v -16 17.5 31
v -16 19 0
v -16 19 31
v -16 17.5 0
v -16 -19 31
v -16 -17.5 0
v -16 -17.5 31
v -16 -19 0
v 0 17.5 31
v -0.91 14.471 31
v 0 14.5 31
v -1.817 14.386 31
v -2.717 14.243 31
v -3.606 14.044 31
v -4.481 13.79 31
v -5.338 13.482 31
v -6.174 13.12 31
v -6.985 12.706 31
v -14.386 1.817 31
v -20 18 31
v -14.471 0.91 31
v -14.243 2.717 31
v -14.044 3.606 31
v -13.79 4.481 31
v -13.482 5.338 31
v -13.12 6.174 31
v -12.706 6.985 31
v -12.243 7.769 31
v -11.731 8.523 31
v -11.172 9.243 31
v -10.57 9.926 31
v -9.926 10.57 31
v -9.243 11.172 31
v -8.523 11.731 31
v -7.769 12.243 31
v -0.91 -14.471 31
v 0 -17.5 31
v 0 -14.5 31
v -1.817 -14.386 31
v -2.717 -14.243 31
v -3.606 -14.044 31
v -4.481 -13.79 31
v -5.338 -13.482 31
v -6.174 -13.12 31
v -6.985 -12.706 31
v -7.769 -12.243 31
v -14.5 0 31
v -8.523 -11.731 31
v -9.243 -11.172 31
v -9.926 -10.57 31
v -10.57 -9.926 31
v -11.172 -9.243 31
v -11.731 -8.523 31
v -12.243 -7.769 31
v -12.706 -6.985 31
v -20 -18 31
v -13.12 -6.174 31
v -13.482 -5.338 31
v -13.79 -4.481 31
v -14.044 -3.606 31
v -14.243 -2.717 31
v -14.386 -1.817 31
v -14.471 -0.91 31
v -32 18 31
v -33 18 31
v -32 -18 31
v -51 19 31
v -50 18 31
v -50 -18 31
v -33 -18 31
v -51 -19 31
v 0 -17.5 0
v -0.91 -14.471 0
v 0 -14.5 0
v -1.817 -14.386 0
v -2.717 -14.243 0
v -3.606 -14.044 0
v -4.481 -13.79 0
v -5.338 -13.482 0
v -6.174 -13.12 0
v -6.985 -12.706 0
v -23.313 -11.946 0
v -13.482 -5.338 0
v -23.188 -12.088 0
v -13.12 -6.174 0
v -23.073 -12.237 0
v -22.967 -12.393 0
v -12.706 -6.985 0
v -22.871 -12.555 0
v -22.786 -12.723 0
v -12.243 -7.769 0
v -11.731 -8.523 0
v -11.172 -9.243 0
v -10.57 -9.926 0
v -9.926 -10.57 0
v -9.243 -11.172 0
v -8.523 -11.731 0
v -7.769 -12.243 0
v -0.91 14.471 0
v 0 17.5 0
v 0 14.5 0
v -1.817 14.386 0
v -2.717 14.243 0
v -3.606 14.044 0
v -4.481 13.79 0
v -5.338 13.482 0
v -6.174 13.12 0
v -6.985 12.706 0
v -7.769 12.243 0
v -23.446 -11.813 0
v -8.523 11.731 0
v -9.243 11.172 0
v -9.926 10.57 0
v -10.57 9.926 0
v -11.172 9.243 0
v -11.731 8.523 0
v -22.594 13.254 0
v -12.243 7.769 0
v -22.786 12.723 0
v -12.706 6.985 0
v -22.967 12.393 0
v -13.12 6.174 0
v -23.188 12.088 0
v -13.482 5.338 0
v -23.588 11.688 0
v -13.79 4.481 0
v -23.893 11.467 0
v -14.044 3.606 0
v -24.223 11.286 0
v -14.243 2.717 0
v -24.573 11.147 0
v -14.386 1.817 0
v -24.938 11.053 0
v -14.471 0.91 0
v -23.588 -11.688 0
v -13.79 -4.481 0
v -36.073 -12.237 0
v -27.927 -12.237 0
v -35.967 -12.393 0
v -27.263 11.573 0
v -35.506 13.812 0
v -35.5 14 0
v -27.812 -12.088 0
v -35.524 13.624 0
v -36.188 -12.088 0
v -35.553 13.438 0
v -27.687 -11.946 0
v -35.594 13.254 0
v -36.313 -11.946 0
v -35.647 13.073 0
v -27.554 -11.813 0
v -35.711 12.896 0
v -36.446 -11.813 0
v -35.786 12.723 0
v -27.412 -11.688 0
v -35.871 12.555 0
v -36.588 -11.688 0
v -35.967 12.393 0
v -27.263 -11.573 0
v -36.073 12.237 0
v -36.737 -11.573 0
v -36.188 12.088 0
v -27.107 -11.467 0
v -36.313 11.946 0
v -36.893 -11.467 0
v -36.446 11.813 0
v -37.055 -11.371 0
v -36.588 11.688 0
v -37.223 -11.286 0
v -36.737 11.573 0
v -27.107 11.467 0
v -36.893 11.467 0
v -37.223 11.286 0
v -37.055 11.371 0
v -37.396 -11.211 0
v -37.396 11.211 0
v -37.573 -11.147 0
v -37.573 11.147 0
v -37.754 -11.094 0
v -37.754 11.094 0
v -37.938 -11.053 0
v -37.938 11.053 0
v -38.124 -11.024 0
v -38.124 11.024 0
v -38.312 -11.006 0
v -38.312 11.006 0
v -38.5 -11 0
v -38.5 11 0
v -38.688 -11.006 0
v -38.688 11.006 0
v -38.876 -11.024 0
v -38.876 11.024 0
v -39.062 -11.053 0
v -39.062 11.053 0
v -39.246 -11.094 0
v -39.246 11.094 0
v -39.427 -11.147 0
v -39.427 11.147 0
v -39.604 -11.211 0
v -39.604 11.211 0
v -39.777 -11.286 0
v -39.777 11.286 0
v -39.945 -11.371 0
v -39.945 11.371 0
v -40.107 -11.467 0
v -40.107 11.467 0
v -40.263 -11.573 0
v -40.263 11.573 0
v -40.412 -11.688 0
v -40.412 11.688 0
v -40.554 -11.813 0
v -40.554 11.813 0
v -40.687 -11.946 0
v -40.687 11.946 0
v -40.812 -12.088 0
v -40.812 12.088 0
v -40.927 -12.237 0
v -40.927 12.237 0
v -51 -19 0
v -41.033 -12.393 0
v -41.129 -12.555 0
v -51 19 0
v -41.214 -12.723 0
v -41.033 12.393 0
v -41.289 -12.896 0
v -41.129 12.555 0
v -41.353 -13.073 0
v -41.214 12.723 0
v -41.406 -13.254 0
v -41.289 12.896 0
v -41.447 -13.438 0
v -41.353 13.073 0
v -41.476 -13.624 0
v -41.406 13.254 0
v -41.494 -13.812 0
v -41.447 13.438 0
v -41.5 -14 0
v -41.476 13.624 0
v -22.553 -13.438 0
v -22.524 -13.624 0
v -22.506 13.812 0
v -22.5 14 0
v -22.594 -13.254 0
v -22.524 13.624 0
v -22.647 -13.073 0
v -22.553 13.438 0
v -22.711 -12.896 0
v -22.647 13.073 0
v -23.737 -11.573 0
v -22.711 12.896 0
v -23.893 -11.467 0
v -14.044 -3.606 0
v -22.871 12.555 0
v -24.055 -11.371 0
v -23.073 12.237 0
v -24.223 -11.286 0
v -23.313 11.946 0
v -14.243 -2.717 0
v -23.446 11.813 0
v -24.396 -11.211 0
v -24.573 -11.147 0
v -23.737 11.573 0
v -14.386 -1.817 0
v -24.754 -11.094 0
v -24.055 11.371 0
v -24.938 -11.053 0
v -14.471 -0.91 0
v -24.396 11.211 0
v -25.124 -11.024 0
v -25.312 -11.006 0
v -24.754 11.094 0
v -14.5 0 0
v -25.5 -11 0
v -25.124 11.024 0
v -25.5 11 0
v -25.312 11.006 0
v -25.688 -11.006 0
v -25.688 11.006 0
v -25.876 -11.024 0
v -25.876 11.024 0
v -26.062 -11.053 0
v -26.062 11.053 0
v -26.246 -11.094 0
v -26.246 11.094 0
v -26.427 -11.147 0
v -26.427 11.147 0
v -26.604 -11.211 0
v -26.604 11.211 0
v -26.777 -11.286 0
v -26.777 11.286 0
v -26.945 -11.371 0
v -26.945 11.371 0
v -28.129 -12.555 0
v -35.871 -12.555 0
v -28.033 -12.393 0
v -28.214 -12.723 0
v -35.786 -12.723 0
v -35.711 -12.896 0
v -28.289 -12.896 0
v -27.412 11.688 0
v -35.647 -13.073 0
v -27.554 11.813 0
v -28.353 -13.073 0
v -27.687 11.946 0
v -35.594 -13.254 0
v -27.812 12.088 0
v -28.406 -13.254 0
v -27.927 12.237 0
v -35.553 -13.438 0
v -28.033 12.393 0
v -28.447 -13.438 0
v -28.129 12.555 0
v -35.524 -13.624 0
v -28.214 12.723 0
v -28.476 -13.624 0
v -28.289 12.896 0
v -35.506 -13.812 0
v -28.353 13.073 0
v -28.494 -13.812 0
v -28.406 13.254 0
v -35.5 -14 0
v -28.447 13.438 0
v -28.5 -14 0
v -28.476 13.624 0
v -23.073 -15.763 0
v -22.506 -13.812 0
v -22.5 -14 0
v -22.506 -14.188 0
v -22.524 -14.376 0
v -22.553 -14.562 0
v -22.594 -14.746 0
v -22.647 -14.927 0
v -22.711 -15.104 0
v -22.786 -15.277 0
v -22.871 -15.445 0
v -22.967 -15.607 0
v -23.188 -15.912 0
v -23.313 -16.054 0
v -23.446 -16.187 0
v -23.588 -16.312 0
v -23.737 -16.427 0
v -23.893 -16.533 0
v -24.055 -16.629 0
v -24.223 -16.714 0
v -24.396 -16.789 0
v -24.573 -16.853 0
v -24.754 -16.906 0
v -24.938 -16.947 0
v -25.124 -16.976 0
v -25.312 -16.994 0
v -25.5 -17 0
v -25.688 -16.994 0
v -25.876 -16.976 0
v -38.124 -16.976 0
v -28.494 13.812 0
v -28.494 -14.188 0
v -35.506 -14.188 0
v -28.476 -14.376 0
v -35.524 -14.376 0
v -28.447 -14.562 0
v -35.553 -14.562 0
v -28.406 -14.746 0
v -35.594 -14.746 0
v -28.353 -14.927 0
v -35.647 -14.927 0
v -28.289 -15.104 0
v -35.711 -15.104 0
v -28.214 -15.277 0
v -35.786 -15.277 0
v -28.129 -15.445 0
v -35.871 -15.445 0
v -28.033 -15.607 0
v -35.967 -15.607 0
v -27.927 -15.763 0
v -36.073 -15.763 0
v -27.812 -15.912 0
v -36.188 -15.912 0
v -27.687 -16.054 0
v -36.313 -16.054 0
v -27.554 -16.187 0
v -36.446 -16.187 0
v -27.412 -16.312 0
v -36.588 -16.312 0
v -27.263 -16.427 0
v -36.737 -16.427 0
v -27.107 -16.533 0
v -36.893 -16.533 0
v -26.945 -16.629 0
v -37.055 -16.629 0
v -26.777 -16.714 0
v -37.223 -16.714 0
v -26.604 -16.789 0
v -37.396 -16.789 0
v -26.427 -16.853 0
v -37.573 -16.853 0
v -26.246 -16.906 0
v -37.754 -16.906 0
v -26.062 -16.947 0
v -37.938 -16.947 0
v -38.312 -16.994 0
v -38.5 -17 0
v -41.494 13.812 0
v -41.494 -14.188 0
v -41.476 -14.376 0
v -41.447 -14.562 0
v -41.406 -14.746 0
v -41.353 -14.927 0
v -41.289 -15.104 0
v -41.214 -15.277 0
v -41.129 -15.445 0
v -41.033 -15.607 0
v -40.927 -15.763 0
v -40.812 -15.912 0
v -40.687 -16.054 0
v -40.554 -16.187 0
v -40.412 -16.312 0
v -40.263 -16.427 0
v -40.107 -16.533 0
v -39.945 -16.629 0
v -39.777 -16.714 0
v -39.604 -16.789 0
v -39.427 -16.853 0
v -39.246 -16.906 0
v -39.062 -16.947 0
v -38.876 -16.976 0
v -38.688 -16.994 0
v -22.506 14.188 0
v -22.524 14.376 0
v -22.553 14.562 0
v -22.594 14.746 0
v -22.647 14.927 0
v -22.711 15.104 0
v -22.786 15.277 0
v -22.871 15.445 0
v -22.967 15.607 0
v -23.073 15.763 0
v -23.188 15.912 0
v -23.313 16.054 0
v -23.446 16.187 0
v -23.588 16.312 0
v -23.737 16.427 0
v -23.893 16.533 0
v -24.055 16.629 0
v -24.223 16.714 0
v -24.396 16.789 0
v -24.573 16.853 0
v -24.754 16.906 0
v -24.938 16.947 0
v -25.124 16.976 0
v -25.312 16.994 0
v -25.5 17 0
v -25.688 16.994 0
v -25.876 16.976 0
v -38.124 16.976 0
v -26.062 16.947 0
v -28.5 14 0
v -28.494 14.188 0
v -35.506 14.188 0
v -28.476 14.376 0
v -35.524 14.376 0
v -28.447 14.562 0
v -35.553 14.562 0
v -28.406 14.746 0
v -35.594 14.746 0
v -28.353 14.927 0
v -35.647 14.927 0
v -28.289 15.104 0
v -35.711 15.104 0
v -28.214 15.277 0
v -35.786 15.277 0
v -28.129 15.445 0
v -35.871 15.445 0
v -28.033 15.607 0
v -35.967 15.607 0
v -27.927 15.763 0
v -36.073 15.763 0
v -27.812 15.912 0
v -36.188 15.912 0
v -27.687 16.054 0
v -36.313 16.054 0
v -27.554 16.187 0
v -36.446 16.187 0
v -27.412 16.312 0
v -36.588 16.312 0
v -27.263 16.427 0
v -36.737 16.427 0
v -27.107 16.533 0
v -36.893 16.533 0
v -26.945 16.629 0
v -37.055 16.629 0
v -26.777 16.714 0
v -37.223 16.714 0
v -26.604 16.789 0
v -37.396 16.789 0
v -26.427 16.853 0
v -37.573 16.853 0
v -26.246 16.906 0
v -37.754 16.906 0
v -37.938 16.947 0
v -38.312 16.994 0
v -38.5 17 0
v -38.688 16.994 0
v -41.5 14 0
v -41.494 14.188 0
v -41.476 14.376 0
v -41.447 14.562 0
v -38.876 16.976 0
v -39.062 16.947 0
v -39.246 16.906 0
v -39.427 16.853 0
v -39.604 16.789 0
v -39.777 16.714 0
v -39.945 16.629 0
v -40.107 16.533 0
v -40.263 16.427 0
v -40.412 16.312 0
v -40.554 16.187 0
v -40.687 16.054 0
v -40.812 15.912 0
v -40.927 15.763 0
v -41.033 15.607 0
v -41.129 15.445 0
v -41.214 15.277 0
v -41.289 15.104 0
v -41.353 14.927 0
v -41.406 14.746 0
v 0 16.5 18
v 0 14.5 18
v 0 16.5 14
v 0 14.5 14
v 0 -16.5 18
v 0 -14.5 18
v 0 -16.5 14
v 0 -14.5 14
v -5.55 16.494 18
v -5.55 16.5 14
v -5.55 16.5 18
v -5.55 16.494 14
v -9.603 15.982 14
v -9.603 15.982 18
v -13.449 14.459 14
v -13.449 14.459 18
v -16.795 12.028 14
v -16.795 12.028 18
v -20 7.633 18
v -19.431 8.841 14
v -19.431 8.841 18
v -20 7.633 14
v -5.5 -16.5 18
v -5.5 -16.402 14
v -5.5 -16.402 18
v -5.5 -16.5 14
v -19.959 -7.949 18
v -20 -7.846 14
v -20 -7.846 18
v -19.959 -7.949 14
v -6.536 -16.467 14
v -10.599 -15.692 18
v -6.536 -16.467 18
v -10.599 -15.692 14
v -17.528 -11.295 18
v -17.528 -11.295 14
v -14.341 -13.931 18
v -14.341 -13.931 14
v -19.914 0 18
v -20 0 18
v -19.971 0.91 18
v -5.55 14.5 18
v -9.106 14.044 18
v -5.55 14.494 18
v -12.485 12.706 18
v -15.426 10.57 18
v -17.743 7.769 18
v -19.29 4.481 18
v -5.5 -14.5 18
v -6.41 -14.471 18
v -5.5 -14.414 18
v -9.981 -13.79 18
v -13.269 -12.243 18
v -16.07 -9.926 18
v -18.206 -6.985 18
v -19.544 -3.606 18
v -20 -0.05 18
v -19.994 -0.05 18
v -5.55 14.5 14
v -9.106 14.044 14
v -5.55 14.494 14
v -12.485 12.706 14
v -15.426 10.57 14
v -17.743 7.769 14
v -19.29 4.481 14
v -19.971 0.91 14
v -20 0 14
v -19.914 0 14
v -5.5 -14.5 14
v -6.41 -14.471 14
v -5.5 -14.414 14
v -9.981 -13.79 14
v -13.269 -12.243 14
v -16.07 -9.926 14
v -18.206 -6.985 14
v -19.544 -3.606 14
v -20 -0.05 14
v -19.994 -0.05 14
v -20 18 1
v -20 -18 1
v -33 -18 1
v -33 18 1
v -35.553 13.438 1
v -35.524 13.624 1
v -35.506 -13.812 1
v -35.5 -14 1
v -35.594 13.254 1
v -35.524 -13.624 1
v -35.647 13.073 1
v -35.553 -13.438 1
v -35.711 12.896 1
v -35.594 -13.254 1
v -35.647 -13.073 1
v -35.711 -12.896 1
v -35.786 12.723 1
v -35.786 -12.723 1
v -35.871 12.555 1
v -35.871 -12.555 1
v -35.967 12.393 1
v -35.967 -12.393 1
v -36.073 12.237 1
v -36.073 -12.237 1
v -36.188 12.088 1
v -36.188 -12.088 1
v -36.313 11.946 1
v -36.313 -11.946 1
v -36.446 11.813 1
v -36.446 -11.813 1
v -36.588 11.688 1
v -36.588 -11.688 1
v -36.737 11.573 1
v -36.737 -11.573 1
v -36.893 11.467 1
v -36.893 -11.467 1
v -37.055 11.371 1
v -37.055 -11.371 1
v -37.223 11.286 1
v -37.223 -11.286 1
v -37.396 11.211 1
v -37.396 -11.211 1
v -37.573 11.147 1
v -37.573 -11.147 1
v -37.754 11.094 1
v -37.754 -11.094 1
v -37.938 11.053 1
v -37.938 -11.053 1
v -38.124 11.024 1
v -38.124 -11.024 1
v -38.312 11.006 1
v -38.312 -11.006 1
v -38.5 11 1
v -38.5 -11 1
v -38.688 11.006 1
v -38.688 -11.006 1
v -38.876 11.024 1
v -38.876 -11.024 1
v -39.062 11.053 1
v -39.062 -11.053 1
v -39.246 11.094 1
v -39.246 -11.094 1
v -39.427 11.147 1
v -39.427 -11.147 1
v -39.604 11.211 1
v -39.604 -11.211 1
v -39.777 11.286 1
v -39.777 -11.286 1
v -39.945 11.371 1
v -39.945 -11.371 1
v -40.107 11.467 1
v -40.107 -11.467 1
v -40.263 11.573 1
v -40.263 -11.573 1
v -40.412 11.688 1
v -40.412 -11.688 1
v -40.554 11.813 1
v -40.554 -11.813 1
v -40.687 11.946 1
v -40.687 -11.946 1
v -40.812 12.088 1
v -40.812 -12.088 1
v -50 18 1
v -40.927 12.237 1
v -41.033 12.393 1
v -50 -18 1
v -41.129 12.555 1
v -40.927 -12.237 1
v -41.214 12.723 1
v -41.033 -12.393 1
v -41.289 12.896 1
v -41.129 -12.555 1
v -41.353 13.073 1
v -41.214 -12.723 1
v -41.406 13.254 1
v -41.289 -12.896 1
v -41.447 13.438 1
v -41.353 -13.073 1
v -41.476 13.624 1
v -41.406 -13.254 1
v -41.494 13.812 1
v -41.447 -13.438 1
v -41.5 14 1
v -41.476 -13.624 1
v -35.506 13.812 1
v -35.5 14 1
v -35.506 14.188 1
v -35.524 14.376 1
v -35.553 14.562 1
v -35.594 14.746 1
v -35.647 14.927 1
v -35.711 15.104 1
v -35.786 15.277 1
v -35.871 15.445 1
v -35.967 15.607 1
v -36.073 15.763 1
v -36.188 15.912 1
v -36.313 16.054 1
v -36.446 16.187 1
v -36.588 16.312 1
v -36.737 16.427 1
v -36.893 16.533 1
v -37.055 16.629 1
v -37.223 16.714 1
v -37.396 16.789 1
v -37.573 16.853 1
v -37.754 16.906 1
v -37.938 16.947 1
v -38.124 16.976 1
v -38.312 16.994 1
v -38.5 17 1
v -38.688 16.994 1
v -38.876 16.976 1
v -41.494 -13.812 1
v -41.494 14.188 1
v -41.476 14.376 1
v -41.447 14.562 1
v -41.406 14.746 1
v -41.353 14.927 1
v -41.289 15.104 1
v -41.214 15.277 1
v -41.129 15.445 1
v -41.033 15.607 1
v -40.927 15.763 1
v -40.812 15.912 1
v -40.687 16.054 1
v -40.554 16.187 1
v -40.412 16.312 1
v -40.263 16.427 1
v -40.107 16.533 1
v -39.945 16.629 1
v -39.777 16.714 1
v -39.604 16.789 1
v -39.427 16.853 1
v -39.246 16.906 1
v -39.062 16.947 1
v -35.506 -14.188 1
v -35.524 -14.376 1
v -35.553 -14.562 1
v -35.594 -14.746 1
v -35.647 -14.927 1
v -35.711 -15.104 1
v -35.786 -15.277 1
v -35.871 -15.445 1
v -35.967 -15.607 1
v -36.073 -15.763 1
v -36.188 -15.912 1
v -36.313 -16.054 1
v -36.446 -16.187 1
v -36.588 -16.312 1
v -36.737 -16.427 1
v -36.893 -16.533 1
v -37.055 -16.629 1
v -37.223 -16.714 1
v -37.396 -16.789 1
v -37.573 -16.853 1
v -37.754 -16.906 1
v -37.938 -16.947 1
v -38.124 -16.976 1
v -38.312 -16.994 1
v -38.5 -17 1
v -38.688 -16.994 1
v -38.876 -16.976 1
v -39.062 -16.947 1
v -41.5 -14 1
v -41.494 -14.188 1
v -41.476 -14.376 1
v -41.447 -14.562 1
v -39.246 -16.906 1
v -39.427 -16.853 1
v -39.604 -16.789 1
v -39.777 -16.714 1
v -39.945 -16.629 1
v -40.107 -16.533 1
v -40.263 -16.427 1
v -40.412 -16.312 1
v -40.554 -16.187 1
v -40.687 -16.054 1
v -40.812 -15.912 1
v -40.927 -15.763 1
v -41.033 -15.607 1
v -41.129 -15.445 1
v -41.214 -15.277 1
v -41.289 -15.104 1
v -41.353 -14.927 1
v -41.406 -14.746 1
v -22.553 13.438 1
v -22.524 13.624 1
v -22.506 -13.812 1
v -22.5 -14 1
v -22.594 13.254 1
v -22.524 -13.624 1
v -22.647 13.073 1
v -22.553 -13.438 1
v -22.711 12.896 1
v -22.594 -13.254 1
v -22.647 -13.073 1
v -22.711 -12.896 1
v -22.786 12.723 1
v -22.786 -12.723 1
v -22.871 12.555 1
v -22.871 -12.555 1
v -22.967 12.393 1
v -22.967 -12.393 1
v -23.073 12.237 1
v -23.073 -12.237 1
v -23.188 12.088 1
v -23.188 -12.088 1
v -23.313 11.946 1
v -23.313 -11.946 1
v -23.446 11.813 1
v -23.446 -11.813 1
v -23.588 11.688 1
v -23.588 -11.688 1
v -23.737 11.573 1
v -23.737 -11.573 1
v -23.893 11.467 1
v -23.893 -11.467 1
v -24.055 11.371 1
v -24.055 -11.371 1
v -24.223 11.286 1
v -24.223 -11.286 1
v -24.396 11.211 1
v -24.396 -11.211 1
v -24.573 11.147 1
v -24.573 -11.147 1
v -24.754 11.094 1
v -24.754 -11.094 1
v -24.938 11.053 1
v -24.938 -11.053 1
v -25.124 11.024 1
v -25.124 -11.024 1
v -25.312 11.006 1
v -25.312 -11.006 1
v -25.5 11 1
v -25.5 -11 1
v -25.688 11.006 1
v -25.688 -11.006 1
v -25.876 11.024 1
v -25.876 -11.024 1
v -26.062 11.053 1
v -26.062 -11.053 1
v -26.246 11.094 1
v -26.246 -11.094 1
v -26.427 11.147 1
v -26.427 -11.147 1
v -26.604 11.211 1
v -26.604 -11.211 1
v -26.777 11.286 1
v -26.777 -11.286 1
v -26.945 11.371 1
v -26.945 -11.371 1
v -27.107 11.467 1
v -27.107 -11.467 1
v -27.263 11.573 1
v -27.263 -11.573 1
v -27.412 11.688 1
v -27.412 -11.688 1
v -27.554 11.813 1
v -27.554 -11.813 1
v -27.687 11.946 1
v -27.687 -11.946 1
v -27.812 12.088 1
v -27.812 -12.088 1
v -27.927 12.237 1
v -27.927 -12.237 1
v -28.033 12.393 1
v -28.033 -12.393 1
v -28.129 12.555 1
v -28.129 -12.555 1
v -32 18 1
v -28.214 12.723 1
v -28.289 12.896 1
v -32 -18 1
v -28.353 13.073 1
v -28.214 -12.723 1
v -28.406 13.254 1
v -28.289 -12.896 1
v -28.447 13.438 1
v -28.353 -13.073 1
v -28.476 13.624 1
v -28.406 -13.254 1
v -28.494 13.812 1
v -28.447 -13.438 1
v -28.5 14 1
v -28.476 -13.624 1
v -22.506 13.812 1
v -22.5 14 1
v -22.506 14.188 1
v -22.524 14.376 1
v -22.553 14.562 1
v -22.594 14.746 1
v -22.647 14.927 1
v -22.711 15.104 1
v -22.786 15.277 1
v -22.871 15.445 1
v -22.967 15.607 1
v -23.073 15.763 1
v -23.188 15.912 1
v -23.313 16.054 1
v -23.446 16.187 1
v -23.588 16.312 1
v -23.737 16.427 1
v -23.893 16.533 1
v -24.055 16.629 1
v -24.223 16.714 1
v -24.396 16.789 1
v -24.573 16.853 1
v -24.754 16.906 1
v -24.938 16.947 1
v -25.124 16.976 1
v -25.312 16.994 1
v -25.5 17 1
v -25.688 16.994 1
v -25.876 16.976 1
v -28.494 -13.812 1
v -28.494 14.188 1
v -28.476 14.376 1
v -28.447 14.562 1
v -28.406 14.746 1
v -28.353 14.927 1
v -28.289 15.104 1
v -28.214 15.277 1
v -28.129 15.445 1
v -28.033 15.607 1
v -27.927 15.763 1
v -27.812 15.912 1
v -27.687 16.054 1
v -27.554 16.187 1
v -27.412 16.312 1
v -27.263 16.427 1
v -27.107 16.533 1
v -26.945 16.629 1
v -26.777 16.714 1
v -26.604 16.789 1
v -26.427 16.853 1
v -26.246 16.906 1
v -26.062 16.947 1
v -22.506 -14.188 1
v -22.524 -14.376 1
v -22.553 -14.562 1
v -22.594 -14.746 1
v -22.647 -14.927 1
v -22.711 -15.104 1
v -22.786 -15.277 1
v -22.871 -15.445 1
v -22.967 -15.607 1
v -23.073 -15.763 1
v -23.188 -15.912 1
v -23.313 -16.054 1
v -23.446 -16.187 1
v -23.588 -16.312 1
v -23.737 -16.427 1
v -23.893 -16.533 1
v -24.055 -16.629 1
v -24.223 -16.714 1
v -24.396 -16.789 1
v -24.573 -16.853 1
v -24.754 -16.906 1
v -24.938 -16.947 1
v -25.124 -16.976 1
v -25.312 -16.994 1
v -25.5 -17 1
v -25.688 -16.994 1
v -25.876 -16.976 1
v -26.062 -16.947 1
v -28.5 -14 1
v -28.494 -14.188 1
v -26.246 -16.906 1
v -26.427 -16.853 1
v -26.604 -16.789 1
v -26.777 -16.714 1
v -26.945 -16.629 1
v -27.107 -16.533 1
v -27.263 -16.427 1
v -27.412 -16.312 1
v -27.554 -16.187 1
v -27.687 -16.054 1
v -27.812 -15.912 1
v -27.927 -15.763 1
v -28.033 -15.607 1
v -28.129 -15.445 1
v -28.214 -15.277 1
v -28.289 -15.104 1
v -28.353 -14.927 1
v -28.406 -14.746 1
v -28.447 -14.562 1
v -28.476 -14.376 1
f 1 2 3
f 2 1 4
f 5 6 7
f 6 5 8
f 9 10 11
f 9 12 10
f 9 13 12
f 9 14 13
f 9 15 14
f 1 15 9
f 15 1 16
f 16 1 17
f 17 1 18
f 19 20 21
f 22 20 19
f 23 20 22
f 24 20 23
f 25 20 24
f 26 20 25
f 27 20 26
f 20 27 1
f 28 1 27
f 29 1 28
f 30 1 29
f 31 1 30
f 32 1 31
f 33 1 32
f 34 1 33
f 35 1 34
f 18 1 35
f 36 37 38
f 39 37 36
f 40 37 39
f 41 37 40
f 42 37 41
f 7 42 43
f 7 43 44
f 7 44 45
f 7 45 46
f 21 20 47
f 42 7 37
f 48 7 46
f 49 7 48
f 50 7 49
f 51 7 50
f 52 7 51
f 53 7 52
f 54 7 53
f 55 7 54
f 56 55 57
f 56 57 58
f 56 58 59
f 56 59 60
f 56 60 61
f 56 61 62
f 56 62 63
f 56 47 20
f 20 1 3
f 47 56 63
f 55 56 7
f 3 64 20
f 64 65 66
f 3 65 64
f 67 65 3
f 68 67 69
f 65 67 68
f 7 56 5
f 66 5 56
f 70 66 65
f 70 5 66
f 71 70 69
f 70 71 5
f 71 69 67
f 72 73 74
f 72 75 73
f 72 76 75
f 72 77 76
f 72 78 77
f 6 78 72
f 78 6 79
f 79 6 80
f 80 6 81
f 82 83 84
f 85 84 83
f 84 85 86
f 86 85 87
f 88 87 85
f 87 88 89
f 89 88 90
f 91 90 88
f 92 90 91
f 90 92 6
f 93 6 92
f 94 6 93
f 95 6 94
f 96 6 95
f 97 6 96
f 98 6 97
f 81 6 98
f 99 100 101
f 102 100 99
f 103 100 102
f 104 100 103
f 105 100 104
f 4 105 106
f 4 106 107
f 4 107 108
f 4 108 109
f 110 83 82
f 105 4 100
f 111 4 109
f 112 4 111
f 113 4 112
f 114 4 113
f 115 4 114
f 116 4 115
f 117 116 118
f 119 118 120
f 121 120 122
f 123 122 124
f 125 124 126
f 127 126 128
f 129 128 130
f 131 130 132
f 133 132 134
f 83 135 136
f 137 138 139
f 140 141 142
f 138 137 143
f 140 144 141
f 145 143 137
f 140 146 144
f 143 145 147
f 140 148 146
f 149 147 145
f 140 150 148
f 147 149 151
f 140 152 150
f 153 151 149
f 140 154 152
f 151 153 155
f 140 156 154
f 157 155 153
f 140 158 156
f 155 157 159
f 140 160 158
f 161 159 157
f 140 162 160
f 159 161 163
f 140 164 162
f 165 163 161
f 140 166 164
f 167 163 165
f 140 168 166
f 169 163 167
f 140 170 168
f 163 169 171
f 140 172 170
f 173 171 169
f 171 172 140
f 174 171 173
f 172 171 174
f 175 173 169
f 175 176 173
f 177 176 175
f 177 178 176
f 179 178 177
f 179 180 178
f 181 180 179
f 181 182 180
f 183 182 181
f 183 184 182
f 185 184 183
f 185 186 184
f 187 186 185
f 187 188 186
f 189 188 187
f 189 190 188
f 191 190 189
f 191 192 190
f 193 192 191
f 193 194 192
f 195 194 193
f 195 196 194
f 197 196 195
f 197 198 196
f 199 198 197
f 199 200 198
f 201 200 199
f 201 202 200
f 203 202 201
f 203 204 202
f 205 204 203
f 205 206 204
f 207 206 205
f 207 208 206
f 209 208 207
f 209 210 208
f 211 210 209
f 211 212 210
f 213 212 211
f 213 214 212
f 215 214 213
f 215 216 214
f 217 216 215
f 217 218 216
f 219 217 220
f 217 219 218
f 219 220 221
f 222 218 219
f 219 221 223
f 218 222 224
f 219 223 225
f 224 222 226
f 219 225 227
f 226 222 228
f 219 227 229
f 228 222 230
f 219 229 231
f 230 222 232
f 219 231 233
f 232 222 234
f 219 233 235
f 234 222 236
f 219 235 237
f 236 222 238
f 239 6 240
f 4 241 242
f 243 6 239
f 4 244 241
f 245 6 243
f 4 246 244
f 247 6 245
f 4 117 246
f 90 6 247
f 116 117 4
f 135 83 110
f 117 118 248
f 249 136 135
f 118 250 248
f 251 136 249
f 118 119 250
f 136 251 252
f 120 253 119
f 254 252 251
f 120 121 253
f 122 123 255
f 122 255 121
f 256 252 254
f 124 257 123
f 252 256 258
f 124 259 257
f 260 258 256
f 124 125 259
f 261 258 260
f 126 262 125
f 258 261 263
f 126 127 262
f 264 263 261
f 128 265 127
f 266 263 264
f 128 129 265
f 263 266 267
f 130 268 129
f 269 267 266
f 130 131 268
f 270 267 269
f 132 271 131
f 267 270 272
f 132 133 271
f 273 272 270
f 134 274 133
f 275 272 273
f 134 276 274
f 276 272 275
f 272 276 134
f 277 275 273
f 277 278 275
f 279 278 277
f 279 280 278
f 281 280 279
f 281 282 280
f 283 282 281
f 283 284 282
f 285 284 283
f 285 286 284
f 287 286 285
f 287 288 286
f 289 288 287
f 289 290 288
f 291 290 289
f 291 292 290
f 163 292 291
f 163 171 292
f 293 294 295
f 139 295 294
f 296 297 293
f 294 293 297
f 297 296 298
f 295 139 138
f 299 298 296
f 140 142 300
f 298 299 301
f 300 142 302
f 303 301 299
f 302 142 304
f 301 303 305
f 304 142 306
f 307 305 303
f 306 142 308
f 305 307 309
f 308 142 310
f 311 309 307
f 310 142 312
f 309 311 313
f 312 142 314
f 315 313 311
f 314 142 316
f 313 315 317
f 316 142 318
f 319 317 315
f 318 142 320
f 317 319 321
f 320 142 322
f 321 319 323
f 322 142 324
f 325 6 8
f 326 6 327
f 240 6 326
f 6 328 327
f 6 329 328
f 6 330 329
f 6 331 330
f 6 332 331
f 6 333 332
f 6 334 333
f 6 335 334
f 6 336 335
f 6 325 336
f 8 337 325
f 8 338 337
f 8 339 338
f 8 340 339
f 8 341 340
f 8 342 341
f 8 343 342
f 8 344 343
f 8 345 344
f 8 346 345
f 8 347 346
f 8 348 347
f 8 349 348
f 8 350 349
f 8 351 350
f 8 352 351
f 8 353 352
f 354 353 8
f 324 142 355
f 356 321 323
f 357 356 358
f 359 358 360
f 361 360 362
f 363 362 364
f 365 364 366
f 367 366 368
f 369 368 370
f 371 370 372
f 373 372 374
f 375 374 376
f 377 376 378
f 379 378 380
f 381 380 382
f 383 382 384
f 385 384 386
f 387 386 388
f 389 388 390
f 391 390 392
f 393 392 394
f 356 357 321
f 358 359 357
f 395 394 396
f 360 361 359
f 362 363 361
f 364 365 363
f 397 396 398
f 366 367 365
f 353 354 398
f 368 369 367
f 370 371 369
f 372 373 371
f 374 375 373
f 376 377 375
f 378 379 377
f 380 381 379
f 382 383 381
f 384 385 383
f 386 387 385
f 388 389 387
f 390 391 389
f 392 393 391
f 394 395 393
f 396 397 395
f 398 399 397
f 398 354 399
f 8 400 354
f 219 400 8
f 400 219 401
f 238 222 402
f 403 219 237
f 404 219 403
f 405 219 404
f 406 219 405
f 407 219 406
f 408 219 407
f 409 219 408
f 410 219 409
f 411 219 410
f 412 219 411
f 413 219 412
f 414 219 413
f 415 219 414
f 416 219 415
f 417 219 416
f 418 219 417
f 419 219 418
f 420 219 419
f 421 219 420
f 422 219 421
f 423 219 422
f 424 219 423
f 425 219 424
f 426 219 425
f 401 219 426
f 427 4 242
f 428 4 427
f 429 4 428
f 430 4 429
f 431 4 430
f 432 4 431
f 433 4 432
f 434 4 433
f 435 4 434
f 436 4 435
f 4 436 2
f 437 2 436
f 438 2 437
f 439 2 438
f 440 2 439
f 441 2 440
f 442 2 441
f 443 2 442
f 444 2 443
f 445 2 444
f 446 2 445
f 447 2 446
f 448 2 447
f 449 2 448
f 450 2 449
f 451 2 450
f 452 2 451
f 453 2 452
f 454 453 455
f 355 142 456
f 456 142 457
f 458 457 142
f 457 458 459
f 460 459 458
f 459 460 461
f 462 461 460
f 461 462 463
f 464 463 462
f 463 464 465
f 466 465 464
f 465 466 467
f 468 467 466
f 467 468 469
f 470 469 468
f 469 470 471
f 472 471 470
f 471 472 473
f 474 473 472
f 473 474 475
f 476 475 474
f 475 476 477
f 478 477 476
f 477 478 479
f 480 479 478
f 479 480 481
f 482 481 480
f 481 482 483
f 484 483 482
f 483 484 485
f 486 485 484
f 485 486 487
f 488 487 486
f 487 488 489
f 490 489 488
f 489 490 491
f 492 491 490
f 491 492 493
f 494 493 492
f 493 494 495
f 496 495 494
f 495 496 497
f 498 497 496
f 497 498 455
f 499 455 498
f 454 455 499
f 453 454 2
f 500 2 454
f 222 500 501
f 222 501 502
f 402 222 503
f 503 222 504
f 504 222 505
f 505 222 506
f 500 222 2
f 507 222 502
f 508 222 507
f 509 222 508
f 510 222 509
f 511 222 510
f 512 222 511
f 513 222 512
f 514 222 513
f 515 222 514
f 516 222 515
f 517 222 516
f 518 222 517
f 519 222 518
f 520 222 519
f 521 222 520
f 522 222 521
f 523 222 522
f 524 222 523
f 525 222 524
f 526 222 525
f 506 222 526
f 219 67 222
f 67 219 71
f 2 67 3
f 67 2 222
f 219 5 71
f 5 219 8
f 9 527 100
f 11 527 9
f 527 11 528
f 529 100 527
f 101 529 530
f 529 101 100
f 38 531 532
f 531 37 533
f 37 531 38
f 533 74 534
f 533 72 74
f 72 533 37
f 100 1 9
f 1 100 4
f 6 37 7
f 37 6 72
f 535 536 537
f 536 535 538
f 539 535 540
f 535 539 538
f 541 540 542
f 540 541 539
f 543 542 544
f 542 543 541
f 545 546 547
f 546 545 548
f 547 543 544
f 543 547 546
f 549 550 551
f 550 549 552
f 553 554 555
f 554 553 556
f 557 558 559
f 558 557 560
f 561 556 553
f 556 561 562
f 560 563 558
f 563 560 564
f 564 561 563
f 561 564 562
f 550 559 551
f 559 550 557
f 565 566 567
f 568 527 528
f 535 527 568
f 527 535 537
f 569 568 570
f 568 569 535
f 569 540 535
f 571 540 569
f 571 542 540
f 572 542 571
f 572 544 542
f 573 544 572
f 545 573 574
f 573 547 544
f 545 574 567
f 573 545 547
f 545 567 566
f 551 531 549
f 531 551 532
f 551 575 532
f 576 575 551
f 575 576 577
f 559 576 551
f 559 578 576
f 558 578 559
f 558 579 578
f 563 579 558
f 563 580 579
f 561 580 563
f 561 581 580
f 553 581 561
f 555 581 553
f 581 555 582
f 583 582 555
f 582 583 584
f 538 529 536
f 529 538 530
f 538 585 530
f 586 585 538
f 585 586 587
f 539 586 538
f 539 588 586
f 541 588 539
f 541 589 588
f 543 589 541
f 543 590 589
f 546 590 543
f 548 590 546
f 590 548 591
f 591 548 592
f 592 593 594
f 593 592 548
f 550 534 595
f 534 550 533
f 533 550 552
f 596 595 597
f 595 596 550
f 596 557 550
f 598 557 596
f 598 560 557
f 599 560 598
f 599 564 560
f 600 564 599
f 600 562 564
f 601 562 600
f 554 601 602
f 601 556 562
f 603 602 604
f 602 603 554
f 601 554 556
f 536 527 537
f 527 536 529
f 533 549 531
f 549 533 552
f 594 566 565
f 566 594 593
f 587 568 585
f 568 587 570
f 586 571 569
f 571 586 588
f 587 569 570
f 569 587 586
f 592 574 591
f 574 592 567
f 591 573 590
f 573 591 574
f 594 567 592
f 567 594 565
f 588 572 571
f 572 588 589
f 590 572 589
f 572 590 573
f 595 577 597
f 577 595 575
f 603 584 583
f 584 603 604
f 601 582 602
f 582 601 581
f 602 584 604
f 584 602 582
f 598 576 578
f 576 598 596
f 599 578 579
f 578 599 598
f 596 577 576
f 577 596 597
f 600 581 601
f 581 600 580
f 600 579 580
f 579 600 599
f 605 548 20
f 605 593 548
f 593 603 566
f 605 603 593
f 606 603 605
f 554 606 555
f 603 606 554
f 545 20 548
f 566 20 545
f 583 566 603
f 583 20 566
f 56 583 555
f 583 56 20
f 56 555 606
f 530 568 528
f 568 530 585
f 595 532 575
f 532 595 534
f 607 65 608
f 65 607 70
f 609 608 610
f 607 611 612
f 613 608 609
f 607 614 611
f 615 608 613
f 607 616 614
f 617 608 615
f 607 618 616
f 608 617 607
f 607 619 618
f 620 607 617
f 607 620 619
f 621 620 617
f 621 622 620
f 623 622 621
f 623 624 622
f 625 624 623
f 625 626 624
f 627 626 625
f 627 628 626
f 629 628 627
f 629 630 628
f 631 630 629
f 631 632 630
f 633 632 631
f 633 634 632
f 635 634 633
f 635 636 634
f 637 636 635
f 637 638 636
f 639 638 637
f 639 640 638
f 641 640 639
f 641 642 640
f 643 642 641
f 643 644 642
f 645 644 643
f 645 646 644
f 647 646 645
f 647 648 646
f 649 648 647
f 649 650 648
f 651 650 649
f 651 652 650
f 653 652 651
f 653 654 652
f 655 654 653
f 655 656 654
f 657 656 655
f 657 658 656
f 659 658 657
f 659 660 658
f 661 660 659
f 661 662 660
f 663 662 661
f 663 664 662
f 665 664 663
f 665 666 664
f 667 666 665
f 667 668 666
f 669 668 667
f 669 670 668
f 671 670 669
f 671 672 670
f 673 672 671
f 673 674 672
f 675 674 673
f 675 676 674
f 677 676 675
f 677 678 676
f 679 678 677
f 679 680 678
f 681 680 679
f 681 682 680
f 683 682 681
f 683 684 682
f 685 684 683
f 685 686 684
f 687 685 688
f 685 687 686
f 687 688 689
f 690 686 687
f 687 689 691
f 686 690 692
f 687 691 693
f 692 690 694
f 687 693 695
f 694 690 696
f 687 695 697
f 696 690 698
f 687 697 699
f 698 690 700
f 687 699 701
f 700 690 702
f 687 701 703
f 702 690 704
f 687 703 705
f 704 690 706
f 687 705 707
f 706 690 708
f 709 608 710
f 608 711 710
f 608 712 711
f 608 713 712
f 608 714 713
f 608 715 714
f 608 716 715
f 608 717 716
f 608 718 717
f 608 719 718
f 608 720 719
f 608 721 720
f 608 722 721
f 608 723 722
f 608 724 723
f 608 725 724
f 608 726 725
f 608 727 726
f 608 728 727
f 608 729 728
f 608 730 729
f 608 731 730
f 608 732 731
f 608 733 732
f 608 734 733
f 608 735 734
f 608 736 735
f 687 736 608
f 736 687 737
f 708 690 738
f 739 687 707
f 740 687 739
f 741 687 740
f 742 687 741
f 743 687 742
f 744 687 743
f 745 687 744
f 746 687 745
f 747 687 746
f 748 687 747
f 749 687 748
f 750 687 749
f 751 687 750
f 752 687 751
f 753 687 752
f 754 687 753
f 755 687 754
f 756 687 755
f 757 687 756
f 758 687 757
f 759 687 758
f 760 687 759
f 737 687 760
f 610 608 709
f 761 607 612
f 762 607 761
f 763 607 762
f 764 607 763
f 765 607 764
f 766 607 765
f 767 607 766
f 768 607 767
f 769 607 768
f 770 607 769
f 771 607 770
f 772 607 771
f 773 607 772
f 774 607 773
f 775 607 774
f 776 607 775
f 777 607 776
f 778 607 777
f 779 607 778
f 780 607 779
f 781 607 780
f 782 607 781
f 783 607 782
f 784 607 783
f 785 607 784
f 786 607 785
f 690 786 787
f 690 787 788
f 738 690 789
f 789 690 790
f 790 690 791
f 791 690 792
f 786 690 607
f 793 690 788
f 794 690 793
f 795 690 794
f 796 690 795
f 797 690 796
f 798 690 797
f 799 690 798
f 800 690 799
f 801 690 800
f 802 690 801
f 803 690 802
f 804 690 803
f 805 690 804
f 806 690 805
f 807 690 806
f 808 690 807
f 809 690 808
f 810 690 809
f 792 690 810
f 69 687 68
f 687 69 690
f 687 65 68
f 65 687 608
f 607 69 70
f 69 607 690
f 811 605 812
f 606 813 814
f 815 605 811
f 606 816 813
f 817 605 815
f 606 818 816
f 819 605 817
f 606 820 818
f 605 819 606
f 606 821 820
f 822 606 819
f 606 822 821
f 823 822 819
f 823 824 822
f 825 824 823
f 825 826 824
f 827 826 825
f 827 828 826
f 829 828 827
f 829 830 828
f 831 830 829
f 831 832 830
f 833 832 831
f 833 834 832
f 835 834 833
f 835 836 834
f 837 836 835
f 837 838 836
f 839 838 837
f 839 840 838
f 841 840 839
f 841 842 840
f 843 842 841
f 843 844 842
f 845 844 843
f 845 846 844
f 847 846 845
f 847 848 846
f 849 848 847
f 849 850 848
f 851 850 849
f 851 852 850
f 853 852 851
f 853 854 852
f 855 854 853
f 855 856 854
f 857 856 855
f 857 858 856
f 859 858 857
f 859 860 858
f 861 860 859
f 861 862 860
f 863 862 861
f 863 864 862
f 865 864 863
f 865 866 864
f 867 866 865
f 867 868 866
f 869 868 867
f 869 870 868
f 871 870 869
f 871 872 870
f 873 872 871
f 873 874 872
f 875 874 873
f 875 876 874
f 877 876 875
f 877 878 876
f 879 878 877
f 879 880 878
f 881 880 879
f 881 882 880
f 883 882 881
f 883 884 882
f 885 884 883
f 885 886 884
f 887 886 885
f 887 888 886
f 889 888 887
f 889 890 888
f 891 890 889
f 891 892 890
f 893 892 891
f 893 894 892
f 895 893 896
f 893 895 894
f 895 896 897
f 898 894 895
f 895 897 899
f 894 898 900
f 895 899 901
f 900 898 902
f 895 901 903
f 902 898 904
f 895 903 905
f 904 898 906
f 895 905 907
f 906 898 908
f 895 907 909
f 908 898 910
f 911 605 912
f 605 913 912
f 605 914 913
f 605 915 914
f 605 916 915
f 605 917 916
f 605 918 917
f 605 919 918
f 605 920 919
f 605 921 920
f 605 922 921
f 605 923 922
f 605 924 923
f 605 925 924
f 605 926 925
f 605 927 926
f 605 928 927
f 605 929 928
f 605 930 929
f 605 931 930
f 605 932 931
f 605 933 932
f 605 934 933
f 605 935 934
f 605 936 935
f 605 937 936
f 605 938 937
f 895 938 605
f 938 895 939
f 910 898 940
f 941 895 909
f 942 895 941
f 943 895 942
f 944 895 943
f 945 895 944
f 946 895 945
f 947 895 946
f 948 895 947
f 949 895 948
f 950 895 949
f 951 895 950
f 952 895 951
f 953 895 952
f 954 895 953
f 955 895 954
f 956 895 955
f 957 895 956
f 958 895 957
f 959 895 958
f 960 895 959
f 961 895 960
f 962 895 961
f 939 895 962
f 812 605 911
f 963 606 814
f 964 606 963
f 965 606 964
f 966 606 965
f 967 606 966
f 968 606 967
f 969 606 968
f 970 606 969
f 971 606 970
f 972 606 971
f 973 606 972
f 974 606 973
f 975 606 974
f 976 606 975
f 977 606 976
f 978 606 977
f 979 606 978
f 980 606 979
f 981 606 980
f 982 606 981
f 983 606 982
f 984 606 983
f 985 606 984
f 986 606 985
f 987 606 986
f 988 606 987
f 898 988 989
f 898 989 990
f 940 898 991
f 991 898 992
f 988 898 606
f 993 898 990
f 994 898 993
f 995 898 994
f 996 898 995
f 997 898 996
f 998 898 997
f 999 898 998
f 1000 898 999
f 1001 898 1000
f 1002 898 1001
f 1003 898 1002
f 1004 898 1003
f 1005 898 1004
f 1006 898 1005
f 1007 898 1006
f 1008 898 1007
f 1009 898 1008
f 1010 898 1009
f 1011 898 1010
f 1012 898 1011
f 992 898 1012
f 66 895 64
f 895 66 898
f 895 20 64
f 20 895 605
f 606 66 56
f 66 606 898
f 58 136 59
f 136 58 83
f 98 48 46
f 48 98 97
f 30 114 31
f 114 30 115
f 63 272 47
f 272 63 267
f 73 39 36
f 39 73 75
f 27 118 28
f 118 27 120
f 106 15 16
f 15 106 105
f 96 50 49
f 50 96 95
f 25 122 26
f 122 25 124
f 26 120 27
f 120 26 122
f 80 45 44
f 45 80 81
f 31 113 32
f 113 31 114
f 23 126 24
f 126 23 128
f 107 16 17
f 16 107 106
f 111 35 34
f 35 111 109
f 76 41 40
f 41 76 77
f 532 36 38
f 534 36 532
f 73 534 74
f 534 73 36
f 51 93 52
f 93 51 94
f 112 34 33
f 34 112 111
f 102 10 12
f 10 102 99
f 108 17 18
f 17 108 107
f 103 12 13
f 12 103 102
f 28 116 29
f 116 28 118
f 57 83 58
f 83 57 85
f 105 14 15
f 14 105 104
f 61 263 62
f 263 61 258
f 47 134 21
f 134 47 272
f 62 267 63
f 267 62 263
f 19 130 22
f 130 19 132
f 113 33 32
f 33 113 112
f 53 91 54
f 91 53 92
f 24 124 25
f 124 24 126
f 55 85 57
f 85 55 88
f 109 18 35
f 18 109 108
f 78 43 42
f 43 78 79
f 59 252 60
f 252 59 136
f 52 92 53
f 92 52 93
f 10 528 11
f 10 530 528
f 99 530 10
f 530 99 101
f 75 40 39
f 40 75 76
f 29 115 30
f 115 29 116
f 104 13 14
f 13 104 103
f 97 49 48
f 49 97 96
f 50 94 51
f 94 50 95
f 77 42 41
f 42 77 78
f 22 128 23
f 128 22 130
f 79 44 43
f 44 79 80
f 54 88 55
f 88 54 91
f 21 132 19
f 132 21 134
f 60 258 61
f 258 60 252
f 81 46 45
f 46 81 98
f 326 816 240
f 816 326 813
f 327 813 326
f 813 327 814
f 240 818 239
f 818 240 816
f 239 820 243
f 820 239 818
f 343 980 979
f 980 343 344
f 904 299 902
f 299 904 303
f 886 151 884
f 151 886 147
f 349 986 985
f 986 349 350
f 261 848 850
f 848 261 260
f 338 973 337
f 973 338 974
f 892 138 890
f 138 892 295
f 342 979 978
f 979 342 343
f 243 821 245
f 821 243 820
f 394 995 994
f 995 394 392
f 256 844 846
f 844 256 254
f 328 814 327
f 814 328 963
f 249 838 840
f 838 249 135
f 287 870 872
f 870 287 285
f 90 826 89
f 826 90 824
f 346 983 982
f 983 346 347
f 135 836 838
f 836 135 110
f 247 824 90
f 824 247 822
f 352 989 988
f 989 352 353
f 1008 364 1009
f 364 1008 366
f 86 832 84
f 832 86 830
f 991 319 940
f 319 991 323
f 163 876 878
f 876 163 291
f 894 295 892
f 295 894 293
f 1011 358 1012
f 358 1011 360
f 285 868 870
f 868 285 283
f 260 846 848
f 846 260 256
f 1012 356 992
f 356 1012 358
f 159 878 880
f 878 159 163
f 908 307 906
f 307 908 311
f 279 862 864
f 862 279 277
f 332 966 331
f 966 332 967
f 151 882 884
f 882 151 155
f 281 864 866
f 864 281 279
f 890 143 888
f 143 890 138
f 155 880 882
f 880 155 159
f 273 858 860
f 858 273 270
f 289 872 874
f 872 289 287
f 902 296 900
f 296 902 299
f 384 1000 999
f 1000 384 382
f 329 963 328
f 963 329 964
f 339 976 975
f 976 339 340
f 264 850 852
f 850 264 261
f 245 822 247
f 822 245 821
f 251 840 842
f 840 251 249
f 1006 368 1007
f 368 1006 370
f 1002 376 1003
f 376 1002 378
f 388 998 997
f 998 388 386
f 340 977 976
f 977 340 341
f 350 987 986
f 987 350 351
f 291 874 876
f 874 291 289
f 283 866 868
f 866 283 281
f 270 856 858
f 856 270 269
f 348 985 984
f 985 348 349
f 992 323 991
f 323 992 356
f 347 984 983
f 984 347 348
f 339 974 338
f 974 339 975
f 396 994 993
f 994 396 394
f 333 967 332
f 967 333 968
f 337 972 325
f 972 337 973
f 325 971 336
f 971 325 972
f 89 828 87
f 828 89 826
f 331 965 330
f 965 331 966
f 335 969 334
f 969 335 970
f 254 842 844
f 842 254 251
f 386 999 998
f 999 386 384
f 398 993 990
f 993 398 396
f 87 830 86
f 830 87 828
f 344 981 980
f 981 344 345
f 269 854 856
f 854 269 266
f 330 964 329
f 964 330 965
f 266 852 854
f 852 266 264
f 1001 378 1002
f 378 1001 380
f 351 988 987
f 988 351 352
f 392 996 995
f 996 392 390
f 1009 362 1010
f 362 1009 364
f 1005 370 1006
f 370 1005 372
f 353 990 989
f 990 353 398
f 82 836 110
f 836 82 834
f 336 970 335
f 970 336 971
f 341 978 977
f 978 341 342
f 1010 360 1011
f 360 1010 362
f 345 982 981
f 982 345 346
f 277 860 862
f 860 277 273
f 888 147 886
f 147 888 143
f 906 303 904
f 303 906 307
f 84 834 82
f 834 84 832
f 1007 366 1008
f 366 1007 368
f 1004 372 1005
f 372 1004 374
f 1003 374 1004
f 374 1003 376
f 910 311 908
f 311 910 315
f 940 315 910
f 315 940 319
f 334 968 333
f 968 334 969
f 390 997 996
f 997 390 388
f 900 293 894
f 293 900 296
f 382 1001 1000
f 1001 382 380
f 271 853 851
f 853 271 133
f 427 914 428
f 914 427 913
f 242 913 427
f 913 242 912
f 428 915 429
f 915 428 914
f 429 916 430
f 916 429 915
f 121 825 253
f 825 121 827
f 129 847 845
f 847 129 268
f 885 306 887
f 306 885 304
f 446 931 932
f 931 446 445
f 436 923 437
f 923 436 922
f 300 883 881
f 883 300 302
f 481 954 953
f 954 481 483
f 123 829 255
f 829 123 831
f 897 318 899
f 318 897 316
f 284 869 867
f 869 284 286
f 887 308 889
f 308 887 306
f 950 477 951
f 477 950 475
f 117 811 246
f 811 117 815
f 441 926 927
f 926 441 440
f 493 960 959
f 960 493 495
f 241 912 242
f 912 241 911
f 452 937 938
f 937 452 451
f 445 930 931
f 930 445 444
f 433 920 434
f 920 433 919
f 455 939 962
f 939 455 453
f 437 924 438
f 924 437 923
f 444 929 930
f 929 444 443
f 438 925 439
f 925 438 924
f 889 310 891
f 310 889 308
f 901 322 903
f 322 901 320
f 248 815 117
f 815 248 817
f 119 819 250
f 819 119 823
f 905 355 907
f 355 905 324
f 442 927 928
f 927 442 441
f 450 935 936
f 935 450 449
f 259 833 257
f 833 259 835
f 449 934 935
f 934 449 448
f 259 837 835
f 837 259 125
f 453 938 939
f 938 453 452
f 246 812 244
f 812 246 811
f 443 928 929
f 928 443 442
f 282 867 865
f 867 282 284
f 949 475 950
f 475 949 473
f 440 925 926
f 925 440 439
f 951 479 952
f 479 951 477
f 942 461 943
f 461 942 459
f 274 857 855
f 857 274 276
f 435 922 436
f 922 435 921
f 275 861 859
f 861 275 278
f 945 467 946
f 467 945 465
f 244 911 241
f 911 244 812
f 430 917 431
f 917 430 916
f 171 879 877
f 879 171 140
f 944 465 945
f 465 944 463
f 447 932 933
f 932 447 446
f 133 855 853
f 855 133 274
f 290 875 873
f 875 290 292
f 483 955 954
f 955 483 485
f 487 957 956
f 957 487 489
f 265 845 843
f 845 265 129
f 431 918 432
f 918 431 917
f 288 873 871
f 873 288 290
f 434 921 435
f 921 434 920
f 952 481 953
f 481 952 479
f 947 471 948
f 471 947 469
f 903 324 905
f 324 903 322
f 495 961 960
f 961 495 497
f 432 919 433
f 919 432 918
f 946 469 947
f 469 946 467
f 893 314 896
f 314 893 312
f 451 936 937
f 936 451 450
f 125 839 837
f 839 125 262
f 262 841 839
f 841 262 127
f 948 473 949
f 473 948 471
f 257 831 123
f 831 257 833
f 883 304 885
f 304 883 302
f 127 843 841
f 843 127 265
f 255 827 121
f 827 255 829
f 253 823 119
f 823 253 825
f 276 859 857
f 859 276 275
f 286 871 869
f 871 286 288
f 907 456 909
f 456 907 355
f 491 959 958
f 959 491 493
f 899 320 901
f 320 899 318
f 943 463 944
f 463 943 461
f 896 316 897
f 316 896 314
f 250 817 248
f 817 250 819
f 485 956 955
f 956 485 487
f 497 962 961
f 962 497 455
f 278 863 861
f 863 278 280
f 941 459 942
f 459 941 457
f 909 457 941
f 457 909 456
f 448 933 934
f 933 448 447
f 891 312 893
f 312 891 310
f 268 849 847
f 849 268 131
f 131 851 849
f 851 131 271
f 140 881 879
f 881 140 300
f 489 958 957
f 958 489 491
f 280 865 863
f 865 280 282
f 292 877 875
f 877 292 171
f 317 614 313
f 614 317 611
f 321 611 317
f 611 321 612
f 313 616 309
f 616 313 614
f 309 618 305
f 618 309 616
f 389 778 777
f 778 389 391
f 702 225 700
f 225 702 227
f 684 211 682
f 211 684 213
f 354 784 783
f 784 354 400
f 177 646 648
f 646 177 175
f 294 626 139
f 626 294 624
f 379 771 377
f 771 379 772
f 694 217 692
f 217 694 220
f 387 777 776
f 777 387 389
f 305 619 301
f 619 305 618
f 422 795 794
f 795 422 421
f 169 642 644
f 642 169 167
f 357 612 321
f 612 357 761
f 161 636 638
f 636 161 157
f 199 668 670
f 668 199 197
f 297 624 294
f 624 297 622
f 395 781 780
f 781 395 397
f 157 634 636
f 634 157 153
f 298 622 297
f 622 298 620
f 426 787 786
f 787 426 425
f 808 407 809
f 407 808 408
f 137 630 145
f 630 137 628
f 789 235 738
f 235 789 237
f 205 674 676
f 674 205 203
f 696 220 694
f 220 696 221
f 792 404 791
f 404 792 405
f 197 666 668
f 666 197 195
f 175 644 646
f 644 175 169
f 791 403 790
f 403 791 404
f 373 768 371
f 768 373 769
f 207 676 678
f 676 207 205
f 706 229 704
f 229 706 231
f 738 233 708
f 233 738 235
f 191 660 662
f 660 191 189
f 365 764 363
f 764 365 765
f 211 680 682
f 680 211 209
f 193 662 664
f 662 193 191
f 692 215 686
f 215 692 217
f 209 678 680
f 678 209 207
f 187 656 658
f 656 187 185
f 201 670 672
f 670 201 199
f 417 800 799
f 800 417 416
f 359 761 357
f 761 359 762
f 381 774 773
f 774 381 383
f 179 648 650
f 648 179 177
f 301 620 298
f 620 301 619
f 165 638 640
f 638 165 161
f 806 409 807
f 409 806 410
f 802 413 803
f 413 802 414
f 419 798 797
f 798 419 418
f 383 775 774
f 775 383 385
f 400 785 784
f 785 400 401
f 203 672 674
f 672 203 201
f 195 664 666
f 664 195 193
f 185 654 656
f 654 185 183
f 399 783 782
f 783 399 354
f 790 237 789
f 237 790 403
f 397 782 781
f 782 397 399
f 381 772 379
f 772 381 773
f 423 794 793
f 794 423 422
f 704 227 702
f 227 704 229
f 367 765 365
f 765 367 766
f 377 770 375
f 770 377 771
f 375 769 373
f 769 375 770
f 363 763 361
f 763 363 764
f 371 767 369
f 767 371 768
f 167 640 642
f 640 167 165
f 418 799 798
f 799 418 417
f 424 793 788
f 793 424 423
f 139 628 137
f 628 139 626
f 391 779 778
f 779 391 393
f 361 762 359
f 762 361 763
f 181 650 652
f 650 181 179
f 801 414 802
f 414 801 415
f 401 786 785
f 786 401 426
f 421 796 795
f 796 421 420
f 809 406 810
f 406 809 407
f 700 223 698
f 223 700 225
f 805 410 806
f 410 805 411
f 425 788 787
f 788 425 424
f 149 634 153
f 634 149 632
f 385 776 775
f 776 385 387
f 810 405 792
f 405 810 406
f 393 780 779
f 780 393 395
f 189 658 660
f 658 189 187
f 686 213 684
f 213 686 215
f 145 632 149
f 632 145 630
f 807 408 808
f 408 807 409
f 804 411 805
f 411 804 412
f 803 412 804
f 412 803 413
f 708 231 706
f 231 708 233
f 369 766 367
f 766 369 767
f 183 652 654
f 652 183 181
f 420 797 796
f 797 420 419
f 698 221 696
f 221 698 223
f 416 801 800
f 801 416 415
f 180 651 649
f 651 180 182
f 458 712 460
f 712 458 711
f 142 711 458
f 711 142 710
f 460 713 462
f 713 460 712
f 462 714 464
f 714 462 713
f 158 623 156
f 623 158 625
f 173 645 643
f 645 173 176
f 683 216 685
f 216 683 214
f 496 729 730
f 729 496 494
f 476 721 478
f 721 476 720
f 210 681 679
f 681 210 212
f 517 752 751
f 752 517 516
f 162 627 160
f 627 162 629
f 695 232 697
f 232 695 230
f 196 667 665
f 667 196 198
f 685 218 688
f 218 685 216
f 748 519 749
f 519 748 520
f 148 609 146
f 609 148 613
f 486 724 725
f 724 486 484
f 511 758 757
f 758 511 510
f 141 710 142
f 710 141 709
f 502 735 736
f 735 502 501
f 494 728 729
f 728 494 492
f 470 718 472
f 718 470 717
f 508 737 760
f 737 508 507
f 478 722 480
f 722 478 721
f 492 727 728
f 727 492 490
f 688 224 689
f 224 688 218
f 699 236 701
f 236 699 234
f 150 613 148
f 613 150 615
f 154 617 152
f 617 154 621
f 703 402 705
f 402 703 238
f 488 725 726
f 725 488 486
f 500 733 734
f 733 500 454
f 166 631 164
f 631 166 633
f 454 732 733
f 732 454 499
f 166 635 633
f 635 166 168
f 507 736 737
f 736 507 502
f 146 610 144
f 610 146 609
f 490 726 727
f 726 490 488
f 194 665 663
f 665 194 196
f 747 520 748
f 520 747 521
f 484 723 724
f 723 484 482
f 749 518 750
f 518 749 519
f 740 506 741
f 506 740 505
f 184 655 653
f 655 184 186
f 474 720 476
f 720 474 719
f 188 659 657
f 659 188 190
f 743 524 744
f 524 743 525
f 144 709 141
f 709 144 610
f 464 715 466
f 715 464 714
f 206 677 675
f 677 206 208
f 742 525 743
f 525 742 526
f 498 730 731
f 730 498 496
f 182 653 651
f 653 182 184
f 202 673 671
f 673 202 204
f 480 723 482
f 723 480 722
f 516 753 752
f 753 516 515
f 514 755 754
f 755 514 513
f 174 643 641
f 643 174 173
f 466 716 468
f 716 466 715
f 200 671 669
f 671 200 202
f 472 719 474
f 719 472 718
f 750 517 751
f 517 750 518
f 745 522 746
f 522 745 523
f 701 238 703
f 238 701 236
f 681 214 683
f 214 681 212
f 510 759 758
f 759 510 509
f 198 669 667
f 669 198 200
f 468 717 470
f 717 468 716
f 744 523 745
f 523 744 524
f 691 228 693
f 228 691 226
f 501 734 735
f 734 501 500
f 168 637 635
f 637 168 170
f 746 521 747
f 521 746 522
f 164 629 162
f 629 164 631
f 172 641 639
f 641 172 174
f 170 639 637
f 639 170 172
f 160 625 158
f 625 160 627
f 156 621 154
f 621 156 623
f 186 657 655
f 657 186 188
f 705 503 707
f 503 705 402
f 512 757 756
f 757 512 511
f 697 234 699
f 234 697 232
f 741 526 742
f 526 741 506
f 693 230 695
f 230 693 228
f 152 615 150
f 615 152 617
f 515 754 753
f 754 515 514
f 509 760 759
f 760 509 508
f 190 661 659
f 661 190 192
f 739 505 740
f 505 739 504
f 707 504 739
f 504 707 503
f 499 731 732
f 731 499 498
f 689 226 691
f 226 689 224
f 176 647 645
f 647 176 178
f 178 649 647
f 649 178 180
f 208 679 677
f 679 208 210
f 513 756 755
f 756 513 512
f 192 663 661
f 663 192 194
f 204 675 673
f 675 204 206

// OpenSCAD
// file: escmount.scad
// CHECK RADIUS of every hole
// Check distance between holes
// Check thickness of ESC and width

use <roundCornersCube.scad>

module escmount(w, t, h) {
difference() {

union() {
translate([-51,-(w/2+t),0])
cube([35,w+t+t,h+t]);
translate([-21,-17.5,0])
cube([21,35,h+t]);
}

translate([-50,-w/2,t])
cube([17,w,h+t+1]);

translate([-32,-w/2,t])
cube([12,w,h+t+1]);

translate([0,0,-1])
cylinder($fn=100,h+t+2,14.5,14.5);

translate([0,0,h/2+1])
difference() {
roundCornersCube(44,33,4,16.5);
roundCornersCube(40,29,4,14.5);
}
}
}

w = 37;
h = 20;
t = 1;

sr = 2.5; // CHANGE thIS
ur = 3;

difference() {
	escmount(w, t, h);
	translate([-37.5,-w/3,-1])
	cylinder($fn=100,3,sr,sr);
	translate([-37.5,w/3,-1])
	cylinder($fn=100,3,sr,sr);
	translate([-37.5,0,-1])
	cylinder($fn=100,3,sr,sr);
	translate([-25.5,0,-1])
	cylinder($fn=100,3,ur,ur);
}
// file: roundCornersCube.scad
/*
http://codeviewer.org/view/code:1b36 
Copyright (C) 2011 Sergio Vilches
This program is free software: you can redistribute it and/or modify it under the terms of the GNU General Public License as published by the Free Software Foundation, either version 3 of the License, or (at your option) any later version.
This program is distributed in the hope that it will be useful, but WITHOUT ANY WARRANTY; without even the implied warranty of MERCHANTABILITY or FITNESS FOR A PARTICULAR PURPOSE. See the GNU General Public License for more details. You should have received a copy of the GNU General Public License along with this program. If not, see <http://www.gnu.org/licenses/>.
Contact: s.vilches.e@gmail.com


    ----------------------------------------------------------- 
                 Round Corners Cube (Extruded)                
      roundCornersCube(x,y,z,r) Where:                        
         - x = Xdir width                                     
         - y = Ydir width                                     
         - z = Height of the cube                             
         - r = Rounding radious                               
                                                              
      Example: roundCornerCube(10,10,2,1);                    
     *Some times it's needed to use F6 to see good results!   
 	 ----------------------------------------------------------- 
*/
// Test it!
// roundCornersCube(10,5,2,1);


module createMeniscus(h,radius) // This module creates the shape that needs to be substracted from a cube to make its corners rounded.
difference(){        //This shape is basicly the difference between a quarter of cylinder and a cube
   translate([radius/2+0.1,radius/2+0.1,0]){
      cube([radius+0.2,radius+0.1,h+0.2],center=true);         // All that 0.x numbers are to avoid "ghost boundaries" when substracting
   }

   cylinder(h=h+0.2,r=radius,$fn = 25,center=true);
}


module roundCornersCube(x,y,z,r)  // Now we just substract the shape we have created in the four corners
difference(){
   cube([x,y,z], center=true);

translate([x/2-r,y/2-r]){  // We move to the first corner (x,y)
      rotate(0){  
         createMeniscus(z,r); // And substract the meniscus
      }
   }
   translate([-x/2+r,y/2-r]){ // To the second corner (-x,y)
      rotate(90){
         createMeniscus(z,r); // But this time we have to rotate the meniscus 90 deg
      }
   }
      translate([-x/2+r,-y/2+r]){ // ... 
      rotate(180){
         createMeniscus(z,r);
      }
   }
      translate([x/2-r,-y/2+r]){
      rotate(270){
         createMeniscus(z,r);
      }
   }
}

module rrc(x,y,z,r) {
   translate([x/2,y/2,z/2])
   roundCornersCube(x,y,z,r);
}
// main file
use <roundCornersCube.scad>
use <escmount.scad>

w = 36;
h = 30;
t = 1;

br = 3;  // CHANGE thIS

difference() {
	escmount(w, t, h);
	translate([-25.5,-14,-1])
	cylinder($fn=100,3,br,br);
	translate([-25.5,14,-1])
	cylinder($fn=100,3,br,br);
	translate([-38.5,-14,-1])
	cylinder($fn=100,3,br,br);
	translate([-38.5,14,-1])
	cylinder($fn=100,3,br,br);
}
